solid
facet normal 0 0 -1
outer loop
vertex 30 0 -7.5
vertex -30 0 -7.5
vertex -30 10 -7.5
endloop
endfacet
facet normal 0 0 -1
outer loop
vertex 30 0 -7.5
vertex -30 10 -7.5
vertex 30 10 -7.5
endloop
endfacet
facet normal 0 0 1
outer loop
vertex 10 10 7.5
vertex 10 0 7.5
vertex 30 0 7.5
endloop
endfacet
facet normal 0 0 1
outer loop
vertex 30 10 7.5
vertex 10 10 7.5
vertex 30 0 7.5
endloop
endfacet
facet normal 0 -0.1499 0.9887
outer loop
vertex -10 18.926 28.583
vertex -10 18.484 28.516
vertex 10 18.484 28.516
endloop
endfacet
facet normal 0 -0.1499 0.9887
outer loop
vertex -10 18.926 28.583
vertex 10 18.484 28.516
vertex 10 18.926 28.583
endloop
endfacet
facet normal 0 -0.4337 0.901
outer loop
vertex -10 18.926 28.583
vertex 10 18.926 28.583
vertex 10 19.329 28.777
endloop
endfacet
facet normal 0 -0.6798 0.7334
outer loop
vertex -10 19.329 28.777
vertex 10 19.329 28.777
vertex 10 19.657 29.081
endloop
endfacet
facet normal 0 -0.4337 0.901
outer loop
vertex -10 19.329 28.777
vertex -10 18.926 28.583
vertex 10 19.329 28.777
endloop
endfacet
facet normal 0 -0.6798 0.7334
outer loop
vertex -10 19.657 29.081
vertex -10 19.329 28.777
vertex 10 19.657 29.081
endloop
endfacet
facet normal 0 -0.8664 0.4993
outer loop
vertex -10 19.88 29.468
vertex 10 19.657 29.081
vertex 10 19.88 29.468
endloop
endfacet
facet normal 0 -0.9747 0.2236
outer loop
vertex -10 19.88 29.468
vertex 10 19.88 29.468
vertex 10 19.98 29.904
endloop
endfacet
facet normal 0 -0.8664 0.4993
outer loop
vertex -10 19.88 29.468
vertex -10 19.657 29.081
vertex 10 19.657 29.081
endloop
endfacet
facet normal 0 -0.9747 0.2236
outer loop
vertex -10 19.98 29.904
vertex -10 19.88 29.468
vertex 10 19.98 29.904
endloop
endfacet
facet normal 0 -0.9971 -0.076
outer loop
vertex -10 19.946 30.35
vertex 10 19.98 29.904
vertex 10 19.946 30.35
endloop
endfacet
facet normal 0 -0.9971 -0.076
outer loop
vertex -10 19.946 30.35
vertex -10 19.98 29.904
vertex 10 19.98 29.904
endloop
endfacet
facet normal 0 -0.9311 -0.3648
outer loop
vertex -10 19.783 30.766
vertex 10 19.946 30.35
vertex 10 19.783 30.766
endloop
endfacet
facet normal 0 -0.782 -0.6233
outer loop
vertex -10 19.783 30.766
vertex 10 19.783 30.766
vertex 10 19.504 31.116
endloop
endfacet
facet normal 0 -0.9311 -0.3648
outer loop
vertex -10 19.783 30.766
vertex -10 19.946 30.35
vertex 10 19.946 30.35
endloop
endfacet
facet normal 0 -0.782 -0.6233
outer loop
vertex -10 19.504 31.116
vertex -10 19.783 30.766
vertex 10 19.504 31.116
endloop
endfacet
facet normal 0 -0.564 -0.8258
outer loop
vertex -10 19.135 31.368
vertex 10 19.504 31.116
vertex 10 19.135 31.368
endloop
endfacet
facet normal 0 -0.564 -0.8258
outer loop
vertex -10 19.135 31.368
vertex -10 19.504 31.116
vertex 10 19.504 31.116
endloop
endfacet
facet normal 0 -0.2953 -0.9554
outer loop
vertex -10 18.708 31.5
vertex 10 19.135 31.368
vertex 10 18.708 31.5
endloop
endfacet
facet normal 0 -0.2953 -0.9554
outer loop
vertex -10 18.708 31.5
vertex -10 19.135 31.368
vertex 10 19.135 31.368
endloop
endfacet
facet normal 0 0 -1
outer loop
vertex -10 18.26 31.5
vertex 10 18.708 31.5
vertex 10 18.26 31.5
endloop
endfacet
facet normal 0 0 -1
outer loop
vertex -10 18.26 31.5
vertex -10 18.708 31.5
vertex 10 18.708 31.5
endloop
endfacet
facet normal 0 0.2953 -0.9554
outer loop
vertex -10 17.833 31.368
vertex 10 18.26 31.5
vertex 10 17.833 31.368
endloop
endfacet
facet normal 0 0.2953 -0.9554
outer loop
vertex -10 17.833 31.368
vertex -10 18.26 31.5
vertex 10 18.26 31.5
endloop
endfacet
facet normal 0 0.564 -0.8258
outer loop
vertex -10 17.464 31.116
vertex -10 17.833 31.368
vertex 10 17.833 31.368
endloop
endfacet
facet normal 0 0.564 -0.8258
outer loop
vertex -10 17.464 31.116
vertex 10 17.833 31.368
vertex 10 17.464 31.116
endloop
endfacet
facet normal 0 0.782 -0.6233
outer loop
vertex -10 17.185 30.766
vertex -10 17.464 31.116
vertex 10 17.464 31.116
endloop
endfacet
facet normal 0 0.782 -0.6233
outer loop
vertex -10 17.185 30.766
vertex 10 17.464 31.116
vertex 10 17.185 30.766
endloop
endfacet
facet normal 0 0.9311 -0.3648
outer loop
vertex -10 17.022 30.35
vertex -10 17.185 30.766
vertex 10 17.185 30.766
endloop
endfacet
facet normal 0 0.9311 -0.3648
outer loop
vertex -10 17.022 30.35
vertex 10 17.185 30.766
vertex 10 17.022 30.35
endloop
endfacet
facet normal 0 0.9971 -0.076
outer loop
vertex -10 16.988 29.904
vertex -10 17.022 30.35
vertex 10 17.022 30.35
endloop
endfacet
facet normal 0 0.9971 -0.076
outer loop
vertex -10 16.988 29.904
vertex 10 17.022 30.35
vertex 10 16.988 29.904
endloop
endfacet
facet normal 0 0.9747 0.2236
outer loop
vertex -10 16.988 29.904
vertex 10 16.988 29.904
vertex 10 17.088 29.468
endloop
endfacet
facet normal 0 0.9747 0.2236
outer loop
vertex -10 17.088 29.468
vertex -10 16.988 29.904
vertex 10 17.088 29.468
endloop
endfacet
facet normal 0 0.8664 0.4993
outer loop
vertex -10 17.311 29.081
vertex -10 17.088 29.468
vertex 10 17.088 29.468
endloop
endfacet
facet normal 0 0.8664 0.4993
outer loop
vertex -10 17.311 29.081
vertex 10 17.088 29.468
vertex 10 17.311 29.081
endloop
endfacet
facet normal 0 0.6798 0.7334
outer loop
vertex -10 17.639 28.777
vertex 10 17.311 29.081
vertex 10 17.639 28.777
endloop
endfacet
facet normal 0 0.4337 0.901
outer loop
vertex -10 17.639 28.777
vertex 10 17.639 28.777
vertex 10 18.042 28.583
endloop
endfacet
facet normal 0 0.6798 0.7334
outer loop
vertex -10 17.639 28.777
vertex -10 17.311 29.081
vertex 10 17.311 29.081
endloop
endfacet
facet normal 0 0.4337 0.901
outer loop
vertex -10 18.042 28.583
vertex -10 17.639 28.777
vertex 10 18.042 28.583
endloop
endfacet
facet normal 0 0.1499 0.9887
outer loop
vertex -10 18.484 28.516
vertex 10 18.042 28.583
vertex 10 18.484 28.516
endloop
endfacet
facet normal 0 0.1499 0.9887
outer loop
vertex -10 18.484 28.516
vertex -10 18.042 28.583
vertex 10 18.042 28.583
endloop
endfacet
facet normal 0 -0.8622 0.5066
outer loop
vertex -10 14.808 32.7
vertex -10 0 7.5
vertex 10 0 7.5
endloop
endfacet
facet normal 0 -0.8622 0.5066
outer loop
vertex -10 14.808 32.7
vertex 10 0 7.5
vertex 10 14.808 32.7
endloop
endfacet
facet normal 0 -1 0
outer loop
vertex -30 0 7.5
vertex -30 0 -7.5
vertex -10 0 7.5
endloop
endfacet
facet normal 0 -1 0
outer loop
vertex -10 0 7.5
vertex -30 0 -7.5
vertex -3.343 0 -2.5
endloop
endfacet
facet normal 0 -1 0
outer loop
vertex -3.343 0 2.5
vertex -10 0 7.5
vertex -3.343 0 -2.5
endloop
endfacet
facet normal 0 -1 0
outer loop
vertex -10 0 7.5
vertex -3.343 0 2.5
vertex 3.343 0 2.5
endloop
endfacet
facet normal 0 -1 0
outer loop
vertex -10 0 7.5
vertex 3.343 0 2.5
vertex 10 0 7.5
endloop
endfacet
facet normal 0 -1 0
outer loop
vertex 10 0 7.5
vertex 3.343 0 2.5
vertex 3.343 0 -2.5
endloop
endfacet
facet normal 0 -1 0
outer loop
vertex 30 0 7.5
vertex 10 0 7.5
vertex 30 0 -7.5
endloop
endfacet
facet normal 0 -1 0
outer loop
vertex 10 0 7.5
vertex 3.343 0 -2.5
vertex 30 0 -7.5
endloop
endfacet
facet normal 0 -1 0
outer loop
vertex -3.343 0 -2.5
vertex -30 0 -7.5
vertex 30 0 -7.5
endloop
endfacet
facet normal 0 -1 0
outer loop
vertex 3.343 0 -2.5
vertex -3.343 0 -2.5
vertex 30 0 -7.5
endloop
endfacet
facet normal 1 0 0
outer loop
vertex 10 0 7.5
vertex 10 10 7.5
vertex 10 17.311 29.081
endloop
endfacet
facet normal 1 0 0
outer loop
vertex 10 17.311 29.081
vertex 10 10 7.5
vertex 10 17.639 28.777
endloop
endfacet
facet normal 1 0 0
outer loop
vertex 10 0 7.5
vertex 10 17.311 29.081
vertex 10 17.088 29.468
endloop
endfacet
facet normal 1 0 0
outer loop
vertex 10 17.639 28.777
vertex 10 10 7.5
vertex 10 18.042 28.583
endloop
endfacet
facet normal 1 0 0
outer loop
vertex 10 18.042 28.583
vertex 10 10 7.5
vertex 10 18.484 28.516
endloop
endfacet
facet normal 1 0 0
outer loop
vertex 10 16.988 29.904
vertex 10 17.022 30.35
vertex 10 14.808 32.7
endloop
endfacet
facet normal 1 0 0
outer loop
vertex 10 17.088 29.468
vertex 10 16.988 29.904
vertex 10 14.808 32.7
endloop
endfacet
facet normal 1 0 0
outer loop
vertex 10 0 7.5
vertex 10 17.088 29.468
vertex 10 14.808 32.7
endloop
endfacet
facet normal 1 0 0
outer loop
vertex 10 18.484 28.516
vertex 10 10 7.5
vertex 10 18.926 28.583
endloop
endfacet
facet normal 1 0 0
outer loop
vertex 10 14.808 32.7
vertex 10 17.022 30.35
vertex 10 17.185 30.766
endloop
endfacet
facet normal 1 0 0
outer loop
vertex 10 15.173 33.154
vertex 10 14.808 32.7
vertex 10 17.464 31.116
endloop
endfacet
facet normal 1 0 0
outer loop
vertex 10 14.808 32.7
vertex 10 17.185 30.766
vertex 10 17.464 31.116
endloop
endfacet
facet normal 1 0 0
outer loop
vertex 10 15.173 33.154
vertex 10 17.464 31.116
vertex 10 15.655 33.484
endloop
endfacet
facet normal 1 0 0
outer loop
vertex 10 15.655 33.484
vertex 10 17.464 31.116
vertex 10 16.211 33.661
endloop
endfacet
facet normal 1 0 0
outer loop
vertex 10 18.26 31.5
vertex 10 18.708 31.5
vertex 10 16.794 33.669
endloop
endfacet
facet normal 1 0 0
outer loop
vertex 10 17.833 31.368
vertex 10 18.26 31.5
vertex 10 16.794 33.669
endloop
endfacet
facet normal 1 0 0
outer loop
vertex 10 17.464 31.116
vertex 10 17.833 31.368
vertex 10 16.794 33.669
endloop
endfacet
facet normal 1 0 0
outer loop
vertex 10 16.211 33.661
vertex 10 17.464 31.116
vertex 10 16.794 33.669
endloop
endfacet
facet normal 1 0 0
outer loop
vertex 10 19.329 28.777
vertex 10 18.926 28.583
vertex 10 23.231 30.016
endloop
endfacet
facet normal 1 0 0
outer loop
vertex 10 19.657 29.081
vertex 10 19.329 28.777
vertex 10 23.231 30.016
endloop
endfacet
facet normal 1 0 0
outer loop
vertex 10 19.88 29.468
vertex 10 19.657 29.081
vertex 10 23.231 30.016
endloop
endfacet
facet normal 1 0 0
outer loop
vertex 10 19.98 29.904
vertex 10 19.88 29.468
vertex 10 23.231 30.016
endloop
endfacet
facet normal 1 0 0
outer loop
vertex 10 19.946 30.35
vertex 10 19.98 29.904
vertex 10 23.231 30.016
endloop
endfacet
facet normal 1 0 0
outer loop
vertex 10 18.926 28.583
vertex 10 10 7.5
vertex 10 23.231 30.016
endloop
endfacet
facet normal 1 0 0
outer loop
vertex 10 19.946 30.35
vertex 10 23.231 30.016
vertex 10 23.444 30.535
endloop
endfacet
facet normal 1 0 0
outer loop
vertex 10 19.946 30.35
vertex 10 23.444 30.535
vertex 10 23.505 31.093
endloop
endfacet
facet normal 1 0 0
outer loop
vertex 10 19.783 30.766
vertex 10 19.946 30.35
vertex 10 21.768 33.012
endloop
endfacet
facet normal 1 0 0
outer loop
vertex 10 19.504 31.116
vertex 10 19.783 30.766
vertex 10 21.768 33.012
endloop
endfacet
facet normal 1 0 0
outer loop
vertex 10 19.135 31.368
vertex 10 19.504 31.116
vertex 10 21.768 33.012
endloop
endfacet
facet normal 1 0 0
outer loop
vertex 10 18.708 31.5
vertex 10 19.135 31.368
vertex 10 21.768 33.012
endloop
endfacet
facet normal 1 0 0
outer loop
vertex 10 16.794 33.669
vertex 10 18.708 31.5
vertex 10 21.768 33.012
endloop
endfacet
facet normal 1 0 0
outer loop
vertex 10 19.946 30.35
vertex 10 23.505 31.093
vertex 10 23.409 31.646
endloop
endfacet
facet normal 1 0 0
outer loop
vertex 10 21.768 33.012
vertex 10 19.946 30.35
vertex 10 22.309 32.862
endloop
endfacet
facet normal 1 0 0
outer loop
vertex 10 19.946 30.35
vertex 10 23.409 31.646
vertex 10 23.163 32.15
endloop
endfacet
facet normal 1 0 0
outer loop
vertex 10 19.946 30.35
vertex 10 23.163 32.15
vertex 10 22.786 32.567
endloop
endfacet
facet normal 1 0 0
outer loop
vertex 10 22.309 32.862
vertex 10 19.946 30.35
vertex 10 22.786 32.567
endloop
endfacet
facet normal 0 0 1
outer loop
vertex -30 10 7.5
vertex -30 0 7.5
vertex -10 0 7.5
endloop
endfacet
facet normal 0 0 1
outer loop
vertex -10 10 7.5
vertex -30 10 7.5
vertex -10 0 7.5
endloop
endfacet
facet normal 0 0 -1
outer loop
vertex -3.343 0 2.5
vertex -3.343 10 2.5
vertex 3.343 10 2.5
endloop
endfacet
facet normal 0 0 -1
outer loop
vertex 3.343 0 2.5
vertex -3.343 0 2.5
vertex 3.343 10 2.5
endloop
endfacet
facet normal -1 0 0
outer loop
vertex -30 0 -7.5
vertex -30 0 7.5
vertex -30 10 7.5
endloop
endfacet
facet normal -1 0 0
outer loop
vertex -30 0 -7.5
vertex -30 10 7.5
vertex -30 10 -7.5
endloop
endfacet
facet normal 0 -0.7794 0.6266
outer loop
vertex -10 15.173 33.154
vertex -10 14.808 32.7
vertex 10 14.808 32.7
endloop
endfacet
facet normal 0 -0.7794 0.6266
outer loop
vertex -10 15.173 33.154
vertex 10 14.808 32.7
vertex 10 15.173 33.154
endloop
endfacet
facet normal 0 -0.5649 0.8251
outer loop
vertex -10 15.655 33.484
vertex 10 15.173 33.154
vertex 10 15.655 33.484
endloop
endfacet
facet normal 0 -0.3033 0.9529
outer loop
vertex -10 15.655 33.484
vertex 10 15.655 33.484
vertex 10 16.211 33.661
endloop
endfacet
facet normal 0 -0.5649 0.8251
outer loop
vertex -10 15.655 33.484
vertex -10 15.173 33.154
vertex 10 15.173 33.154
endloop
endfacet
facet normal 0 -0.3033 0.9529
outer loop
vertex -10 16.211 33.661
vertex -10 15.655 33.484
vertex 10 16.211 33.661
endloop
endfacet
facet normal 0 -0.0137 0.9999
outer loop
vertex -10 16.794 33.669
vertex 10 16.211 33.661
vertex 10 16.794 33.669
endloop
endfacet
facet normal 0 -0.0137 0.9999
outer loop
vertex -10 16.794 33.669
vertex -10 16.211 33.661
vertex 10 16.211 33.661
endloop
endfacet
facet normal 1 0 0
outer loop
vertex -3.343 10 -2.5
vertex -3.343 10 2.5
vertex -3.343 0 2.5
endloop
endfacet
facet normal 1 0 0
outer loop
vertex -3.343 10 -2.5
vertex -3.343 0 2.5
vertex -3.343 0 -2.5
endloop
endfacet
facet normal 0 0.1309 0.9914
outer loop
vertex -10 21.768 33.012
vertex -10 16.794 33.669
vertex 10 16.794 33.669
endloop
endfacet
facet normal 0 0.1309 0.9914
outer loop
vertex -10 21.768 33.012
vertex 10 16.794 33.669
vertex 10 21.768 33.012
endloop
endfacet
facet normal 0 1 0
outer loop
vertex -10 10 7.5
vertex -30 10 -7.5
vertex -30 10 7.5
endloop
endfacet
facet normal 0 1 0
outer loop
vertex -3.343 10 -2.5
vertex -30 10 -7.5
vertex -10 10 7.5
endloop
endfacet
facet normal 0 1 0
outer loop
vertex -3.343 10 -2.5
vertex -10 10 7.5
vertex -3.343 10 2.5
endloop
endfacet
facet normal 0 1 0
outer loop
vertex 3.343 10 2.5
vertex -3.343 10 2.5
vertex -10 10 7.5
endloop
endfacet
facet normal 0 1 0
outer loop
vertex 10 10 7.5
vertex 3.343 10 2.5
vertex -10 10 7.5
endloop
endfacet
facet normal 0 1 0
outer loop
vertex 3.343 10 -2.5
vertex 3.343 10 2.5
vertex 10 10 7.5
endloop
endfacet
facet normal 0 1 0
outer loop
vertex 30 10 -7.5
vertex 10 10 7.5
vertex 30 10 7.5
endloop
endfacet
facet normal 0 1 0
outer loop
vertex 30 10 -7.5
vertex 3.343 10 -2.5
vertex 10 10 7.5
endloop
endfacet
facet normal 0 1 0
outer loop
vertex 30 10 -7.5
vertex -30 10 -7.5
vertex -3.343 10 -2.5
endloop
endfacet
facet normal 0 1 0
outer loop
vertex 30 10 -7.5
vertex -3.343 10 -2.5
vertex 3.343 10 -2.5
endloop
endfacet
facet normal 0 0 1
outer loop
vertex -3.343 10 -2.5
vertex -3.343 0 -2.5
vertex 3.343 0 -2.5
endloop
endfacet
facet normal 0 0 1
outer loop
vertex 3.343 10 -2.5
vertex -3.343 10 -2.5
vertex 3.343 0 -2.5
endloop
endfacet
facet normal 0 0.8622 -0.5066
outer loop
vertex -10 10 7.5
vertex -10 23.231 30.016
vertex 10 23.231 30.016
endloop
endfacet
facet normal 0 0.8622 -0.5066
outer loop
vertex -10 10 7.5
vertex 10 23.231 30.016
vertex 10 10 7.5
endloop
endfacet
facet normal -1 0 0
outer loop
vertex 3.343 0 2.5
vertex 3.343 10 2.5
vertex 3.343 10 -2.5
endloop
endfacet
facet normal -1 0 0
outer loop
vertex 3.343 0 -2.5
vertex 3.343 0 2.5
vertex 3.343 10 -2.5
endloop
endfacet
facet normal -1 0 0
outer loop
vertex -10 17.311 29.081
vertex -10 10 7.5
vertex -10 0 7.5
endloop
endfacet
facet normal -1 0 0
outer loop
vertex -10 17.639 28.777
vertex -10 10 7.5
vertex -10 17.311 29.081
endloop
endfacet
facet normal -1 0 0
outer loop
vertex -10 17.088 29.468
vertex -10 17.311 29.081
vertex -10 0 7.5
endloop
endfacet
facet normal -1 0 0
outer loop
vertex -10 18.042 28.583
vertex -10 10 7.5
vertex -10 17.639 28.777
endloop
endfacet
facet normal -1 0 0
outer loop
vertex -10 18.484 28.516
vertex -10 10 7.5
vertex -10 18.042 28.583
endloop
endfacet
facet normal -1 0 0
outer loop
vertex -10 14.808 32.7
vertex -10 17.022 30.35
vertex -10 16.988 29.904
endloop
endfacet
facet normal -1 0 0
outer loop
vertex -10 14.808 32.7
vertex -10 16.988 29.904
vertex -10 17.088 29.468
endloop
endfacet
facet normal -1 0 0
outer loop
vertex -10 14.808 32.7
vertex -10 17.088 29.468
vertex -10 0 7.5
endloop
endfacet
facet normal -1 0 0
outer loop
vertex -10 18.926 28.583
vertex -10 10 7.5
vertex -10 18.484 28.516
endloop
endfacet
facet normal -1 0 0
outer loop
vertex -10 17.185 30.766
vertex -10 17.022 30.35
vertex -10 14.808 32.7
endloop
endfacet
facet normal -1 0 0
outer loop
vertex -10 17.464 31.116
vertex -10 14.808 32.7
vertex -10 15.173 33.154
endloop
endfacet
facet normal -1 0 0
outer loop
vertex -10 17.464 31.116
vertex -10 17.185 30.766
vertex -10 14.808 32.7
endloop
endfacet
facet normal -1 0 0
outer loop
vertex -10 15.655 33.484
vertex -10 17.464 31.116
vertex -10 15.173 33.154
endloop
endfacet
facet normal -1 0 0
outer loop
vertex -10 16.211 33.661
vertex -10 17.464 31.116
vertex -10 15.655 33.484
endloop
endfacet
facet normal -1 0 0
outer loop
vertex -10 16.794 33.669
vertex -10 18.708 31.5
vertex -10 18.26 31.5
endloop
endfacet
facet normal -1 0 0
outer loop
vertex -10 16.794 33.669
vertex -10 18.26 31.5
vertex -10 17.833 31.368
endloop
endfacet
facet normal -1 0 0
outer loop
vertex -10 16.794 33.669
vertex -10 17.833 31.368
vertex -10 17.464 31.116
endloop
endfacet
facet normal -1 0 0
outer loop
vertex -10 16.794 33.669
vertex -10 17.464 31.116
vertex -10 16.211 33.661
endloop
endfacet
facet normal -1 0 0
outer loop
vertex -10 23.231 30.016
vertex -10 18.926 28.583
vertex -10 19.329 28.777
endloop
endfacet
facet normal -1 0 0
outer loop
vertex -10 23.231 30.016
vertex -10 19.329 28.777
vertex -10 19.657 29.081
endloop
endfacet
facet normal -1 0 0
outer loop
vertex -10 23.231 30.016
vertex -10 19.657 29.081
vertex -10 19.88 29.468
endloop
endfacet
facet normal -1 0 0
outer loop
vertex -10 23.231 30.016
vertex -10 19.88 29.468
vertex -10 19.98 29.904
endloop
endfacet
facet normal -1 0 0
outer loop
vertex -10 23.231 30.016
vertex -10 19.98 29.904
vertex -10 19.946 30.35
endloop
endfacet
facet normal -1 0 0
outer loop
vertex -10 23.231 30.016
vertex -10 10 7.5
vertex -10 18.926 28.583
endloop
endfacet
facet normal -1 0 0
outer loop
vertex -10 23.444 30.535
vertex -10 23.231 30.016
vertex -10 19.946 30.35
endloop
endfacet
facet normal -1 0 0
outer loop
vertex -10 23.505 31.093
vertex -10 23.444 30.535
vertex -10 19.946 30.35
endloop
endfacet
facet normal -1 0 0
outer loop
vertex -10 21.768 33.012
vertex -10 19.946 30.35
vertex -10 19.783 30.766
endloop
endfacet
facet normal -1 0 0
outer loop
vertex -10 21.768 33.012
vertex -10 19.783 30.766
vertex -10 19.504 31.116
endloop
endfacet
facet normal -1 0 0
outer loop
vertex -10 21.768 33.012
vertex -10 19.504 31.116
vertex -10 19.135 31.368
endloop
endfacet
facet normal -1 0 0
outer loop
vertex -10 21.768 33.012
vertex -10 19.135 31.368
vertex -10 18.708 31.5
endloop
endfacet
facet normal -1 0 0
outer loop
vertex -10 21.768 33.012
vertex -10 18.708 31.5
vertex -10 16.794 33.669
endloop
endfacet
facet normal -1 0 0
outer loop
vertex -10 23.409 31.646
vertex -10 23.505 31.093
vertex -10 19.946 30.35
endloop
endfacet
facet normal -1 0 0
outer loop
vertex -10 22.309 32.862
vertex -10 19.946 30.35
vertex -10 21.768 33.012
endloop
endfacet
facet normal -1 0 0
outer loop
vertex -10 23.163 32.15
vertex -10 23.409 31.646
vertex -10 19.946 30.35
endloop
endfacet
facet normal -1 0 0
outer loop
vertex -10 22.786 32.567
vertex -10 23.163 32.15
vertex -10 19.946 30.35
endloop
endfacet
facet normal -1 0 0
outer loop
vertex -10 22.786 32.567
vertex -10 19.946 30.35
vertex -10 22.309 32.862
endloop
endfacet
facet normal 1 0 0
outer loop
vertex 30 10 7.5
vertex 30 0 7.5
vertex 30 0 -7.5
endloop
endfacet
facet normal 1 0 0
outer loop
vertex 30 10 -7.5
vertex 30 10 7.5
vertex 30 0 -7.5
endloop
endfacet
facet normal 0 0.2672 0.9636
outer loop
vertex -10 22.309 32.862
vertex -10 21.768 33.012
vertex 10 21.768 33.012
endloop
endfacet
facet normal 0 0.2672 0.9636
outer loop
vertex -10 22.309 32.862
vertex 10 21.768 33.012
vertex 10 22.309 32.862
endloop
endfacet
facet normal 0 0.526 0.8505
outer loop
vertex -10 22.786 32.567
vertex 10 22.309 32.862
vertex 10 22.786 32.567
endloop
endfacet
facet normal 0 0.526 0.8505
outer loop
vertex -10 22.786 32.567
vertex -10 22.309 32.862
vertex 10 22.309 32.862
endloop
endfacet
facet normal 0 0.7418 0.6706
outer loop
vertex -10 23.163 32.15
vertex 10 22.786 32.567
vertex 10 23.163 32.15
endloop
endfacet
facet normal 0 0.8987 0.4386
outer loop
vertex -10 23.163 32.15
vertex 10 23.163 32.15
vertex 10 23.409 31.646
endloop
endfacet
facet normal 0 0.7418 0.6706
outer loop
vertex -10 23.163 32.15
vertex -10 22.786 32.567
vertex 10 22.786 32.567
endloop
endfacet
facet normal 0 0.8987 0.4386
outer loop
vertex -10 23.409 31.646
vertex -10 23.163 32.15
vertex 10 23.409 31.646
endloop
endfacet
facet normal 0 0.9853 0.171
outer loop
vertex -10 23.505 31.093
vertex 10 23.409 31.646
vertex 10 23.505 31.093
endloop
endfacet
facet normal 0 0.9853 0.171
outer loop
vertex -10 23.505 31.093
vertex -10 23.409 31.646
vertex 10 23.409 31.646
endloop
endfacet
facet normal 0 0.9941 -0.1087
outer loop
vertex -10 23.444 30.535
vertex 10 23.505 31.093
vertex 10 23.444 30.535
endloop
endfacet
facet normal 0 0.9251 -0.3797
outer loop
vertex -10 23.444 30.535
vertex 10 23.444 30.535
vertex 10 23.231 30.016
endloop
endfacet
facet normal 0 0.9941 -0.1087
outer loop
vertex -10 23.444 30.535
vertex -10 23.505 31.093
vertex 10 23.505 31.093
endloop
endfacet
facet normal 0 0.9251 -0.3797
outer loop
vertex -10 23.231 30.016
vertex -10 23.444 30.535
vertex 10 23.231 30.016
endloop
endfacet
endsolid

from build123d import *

# Parameters (mm, degrees)
ESQUISSE1_W             = 60
ESQUISSE1_H             = 15
ESQUISSE1_R             = 3.64432939
BOSS_EXTRU_2_DEPTH      = 10
BOSS_EXTRU_3_DEPTH      = 10
BOSS_EXTRU_3_DEPTH_BACK = 10
ESQUISSE2_R             = 1.5
ESQUISSE3_W             = 6.68566512
ESQUISSE3_H             = 5
ENL_V_MAT_EXTRU_1_DEPTH = 10
BOSS_EXTRU_5_DEPTH      = 10


with BuildPart() as part:
    # Esquisse1 → Boss.-Extru.2 (new body)
    with BuildSketch(Plane(origin=(0, 0, 0), x_dir=(1, 0, 0), z_dir=(0, 1, 0))):
        Rectangle(ESQUISSE1_W, ESQUISSE1_H)
        with Locations(Location((0, 0, 0), (0, 0, 270))):
            Circle(ESQUISSE1_R, mode=Mode.SUBTRACT)
    extrude(amount=BOSS_EXTRU_2_DEPTH)

    # Esquisse2 → Boss.-Extru.3 (add, two sides: drawn at the far end of the back side and taken through both)
    with BuildSketch(Plane(origin=(0, 0, 0), x_dir=(0, 0, -1), z_dir=(1, 0, 0)).offset(-BOSS_EXTRU_3_DEPTH_BACK)):
        with BuildLine():
            Line((-7.5, 0), (-32.699931919, 14.80760574))
            ThreePointArc((-32.699931919, 14.80760574), (-33.484005092, 15.654628224), (-33.66947754, 16.793846289))
            Line((-33.66947754, 16.793846289), (-33.012420508, 21.768308704))
            ThreePointArc((-33.012420508, 21.768308704), (-31.906962943, 23.303717227), (-30.016409528, 23.230754593))
            Line((-30.016409528, 23.230754593), (-7.5, 10))
            Line((-7.5, 10), (-7.5, 0))
        make_face()
        with Locations((-30.016409528, 18.484014396)):
            Circle(ESQUISSE2_R, mode=Mode.SUBTRACT)
    extrude(amount=BOSS_EXTRU_3_DEPTH + BOSS_EXTRU_3_DEPTH_BACK)

    # Esquisse3 → Enlèv. mat.-Extru.1 (cut)
    with BuildSketch(Plane(origin=(0, 10, 0), x_dir=(1, 0, 0), z_dir=(0, 1, 0))):
        Rectangle(ESQUISSE3_W, ESQUISSE3_H)
    extrude(amount=-ENL_V_MAT_EXTRU_1_DEPTH, mode=Mode.SUBTRACT)

    # Esquisse4 → Boss.-Extru.5 (add)
    with BuildSketch(Plane(origin=(0, 10, 0), x_dir=(1, 0, 0), z_dir=(0, 1, 0))):
        Polygon((-2.651629066, 2.5), (2.651629066, 2.5), (-0.901511212, 6.613696731), align=None)
        Polygon((-3.34283256, 1.451415578), (-3.34283256, -1.451415578), (-3.984232775, -1.229734519), (-3.663532667, 1.451415578), align=None)
        Polygon((3.34283256, 1.451415578), (3.34283256, -1.451415578), (4.44759228, -1.229734519), (3.971212027, 1.14433262), align=None)
        Polygon((2.651629066, -2.5), (-2.651629066, -2.5), (-2.371334481, -3.89686345), (1.661330759, -4.071090574), align=None)
    extrude(amount=-BOSS_EXTRU_5_DEPTH)


solid = part.part
